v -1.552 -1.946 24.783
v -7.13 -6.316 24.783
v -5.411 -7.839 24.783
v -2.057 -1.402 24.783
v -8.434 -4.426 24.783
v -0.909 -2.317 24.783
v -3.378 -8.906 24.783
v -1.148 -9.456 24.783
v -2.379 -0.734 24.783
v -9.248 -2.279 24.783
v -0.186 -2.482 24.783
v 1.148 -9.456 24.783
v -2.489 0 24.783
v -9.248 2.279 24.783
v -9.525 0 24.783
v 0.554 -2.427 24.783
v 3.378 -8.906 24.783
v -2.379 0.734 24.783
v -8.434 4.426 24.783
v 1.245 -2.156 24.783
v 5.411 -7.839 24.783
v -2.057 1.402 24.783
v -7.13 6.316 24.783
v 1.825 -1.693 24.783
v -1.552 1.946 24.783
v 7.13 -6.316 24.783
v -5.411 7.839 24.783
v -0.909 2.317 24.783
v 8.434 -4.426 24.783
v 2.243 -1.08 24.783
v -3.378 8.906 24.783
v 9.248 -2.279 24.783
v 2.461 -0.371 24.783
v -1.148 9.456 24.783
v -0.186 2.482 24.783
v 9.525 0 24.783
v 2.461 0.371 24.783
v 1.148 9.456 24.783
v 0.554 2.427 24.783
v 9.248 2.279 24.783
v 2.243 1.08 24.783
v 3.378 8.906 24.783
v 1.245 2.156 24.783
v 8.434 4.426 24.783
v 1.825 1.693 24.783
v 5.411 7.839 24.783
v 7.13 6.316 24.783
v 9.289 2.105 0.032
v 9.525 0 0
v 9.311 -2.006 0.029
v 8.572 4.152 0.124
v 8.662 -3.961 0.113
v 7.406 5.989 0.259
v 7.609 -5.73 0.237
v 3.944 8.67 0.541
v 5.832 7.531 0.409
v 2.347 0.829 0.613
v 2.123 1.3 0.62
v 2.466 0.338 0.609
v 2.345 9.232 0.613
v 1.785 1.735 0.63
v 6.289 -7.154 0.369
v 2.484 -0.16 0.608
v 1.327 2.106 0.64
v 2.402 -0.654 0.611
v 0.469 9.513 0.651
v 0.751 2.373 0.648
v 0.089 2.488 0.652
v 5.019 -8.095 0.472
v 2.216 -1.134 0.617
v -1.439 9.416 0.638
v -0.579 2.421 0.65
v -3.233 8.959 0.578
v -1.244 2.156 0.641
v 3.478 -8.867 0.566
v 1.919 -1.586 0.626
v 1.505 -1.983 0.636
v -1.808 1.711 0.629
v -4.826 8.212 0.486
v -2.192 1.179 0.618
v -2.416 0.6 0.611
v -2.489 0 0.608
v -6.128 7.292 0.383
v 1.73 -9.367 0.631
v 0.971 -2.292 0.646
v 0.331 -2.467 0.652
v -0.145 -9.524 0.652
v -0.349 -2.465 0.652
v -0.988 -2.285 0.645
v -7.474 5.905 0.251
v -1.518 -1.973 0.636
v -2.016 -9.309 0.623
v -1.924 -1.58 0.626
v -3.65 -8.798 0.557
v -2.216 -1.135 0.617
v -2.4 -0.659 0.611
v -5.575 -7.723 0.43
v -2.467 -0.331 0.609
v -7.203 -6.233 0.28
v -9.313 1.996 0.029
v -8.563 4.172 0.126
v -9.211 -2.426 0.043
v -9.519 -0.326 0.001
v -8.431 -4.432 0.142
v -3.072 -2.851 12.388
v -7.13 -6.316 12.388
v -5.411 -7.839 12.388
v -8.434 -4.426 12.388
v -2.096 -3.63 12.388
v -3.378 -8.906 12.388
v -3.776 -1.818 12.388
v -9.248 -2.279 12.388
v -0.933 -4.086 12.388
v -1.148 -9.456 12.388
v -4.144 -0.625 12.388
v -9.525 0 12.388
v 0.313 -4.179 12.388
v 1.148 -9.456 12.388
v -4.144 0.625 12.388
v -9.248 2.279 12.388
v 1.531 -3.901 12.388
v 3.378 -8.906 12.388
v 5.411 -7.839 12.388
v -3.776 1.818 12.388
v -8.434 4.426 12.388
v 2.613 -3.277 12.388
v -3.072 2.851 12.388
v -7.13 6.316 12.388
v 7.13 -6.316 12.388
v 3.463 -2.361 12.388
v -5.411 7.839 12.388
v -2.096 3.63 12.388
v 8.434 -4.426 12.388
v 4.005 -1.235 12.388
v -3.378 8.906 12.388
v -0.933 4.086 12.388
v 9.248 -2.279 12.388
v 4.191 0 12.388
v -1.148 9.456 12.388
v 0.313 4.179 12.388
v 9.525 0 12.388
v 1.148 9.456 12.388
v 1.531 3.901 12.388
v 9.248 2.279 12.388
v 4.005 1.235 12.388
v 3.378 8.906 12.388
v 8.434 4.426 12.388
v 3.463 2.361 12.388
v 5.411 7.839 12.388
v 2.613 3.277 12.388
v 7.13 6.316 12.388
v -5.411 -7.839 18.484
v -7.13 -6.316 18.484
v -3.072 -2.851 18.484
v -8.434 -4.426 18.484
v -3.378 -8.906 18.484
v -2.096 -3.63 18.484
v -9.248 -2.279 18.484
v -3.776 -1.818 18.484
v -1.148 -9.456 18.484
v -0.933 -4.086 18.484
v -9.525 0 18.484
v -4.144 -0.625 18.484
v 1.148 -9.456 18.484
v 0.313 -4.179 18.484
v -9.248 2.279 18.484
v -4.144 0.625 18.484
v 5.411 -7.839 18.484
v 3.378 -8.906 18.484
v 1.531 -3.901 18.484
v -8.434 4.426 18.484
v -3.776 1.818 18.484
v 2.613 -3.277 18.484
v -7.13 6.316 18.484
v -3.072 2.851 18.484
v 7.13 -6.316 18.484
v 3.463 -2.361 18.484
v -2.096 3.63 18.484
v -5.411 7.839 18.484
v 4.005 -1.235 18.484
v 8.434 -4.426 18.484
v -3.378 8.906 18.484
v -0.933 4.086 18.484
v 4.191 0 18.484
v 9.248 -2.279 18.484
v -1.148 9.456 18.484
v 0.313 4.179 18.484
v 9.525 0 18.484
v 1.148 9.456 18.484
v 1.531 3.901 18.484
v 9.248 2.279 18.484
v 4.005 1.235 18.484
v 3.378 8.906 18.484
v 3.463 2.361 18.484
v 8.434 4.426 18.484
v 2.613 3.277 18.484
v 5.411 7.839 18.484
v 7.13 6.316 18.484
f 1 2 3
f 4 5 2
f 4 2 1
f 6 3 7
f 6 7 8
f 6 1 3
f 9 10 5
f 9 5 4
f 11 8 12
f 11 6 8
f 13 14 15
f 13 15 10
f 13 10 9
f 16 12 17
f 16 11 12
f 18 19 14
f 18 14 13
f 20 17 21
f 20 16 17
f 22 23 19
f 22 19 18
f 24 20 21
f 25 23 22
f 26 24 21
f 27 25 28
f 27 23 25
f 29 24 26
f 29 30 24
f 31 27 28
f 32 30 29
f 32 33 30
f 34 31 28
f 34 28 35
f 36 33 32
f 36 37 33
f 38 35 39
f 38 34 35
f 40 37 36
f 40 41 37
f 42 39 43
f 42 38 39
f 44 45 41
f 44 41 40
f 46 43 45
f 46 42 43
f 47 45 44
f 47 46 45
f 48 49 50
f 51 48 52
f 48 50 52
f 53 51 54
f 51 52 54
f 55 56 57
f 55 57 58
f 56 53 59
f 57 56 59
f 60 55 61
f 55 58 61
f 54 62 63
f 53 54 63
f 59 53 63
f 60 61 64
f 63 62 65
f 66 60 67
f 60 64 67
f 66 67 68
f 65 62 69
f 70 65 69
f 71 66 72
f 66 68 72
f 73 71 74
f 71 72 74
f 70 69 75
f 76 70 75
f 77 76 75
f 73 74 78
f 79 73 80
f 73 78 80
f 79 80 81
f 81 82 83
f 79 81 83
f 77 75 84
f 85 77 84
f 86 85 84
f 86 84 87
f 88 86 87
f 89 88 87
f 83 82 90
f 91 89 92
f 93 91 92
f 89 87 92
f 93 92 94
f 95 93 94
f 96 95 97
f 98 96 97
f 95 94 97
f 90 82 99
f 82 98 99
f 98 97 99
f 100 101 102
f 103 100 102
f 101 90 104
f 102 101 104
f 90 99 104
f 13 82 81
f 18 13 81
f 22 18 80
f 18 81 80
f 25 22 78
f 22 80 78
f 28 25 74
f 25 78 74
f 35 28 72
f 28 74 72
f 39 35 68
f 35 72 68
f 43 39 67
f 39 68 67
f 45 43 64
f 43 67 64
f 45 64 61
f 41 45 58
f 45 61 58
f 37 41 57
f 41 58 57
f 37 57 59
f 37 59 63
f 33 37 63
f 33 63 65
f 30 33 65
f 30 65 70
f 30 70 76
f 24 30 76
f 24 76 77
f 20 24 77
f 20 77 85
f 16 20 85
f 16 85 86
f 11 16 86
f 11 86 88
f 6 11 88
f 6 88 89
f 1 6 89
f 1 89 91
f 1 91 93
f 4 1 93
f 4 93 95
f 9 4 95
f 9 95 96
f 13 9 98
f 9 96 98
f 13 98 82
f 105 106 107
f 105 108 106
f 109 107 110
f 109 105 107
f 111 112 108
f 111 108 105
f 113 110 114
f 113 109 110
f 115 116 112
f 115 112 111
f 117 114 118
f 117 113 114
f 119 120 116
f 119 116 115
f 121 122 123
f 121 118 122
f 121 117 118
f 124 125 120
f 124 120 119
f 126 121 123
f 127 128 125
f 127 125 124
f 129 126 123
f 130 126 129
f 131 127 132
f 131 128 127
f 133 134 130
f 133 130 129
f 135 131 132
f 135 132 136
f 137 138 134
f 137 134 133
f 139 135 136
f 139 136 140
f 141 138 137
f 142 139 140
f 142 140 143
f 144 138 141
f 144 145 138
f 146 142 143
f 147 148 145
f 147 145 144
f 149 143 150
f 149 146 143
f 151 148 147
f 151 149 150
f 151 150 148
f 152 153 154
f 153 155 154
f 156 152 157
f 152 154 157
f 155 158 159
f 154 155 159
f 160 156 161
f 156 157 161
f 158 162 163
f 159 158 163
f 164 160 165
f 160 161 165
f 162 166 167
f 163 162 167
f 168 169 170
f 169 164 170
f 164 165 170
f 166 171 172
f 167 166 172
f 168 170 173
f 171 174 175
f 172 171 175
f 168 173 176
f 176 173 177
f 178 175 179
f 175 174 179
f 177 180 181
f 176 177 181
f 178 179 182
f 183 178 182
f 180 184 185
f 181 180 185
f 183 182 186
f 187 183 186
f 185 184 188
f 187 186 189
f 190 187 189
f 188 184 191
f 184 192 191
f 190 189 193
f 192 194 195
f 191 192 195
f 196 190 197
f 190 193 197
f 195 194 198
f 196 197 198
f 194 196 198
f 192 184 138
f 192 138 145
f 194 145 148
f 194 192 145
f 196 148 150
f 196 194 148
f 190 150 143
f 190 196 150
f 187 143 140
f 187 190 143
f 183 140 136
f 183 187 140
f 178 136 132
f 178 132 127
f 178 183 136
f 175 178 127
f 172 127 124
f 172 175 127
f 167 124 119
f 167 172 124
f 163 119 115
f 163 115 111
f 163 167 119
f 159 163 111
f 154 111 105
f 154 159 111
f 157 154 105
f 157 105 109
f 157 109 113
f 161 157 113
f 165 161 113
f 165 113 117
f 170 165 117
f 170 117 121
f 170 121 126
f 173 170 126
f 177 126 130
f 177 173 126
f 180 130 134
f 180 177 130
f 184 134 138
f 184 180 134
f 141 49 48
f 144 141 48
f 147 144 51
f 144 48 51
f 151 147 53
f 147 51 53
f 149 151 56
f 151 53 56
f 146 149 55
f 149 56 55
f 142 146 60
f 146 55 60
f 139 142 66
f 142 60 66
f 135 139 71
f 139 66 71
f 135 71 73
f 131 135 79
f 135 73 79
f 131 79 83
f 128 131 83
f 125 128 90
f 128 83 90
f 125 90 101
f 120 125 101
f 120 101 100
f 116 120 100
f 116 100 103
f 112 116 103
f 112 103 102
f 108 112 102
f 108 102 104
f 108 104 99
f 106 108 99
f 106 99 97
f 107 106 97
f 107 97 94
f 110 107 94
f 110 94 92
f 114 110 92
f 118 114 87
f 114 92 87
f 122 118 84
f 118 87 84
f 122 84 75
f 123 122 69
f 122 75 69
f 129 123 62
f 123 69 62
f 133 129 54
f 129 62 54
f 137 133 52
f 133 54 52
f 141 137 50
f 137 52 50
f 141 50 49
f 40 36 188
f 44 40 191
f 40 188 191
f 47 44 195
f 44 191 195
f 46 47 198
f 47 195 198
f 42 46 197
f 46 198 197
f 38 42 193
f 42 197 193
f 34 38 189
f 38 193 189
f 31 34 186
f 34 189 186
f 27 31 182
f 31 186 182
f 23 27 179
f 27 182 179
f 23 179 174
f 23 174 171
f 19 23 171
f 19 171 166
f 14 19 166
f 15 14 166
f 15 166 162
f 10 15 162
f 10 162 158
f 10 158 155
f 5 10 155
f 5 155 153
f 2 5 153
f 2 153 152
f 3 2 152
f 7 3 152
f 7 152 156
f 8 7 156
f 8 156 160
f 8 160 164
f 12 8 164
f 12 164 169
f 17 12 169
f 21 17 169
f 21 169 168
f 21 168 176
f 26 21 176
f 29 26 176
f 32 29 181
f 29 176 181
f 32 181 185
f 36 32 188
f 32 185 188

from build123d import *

# Parameters (mm, degrees)
SKETCH1_R              = 9.525
EXTRUDE1_DEPTH         = 24.78278
SKETCH2_OUTSIDE_W      = 28.372
SKETCH2_OUTSIDE_H      = 28.372
SKETCH2_OUTSIDE_R      = 4.191
EXTRUDE2_DEPTH         = 6.096
EXTRUDE3_DEPTH         = 29.207045831
EXTRUDE3_DEPTH_BACK    = 29.207045831
F_10_CLEARANCE_HOLE1_D = 4.9784


with BuildPart() as part:
    # Sketch1 → Extrude1 (new body)
    with BuildSketch(Plane.XY):
        Circle(SKETCH1_R)
    extrude(amount=EXTRUDE1_DEPTH)

    # Sketch2 outside → Extrude2 (cut)
    with BuildSketch(Plane.XY.offset(18.48358)):
        Rectangle(SKETCH2_OUTSIDE_W, SKETCH2_OUTSIDE_H)
        Circle(SKETCH2_OUTSIDE_R, mode=Mode.SUBTRACT)
    extrude(amount=-EXTRUDE2_DEPTH, mode=Mode.SUBTRACT)

    # Sketch3 → Extrude3 (cut, two sides: drawn at the far end of the back side and taken through both)
    with BuildSketch(Plane(origin=(0, 0, 0), x_dir=(1, 0, 0), z_dir=(0, 1, 0)).offset(-EXTRUDE3_DEPTH_BACK)):
        with BuildLine():
            Line((81.364445057, 9.888659405), (9.525, 0))
            ThreePointArc((9.525, 0), (0, -0.652479271), (-9.525, 0))
            Line((-9.525, 0), (-81.364445057, 9.888659405))
            Line((-81.364445057, 9.888659405), (-81.364445057, 154.92233068))
            Line((-81.364445057, 154.92233068), (81.364445057, 154.92233068))
            Line((81.364445057, 154.92233068), (81.364445057, 9.888659405))
        make_face()
    extrude(amount=EXTRUDE3_DEPTH + EXTRUDE3_DEPTH_BACK, mode=Mode.SUBTRACT)

    # #10 Clearance Hole1 (through all)
    with Locations(Plane.XY.offset(24.78278)):
        with Locations((0, 0)):
            Hole(F_10_CLEARANCE_HOLE1_D / 2)


solid = part.part
